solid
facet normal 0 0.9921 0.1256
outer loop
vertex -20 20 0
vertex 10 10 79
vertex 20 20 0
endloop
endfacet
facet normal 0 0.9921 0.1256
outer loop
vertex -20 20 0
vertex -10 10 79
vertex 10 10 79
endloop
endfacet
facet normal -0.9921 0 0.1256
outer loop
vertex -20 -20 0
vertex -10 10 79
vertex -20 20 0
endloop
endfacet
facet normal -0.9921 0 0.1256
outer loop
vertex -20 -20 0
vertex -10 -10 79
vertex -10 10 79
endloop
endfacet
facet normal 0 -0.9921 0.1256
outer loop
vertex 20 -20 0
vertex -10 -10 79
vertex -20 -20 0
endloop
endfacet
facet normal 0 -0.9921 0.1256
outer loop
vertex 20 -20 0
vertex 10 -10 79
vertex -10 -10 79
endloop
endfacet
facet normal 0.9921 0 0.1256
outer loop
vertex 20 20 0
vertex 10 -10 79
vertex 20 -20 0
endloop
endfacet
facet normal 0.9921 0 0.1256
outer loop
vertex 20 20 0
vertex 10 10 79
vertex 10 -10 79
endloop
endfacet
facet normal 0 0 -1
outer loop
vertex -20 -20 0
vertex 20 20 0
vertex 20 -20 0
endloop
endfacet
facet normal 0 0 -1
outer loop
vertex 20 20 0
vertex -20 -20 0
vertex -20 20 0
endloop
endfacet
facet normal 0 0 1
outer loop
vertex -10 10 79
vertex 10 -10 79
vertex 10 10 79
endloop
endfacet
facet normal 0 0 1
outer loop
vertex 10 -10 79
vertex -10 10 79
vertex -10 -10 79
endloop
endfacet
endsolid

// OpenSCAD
rotate([0,0,45])cylinder(79,d1=40/cos(45),d2=20/cos(45),$fn=4);
